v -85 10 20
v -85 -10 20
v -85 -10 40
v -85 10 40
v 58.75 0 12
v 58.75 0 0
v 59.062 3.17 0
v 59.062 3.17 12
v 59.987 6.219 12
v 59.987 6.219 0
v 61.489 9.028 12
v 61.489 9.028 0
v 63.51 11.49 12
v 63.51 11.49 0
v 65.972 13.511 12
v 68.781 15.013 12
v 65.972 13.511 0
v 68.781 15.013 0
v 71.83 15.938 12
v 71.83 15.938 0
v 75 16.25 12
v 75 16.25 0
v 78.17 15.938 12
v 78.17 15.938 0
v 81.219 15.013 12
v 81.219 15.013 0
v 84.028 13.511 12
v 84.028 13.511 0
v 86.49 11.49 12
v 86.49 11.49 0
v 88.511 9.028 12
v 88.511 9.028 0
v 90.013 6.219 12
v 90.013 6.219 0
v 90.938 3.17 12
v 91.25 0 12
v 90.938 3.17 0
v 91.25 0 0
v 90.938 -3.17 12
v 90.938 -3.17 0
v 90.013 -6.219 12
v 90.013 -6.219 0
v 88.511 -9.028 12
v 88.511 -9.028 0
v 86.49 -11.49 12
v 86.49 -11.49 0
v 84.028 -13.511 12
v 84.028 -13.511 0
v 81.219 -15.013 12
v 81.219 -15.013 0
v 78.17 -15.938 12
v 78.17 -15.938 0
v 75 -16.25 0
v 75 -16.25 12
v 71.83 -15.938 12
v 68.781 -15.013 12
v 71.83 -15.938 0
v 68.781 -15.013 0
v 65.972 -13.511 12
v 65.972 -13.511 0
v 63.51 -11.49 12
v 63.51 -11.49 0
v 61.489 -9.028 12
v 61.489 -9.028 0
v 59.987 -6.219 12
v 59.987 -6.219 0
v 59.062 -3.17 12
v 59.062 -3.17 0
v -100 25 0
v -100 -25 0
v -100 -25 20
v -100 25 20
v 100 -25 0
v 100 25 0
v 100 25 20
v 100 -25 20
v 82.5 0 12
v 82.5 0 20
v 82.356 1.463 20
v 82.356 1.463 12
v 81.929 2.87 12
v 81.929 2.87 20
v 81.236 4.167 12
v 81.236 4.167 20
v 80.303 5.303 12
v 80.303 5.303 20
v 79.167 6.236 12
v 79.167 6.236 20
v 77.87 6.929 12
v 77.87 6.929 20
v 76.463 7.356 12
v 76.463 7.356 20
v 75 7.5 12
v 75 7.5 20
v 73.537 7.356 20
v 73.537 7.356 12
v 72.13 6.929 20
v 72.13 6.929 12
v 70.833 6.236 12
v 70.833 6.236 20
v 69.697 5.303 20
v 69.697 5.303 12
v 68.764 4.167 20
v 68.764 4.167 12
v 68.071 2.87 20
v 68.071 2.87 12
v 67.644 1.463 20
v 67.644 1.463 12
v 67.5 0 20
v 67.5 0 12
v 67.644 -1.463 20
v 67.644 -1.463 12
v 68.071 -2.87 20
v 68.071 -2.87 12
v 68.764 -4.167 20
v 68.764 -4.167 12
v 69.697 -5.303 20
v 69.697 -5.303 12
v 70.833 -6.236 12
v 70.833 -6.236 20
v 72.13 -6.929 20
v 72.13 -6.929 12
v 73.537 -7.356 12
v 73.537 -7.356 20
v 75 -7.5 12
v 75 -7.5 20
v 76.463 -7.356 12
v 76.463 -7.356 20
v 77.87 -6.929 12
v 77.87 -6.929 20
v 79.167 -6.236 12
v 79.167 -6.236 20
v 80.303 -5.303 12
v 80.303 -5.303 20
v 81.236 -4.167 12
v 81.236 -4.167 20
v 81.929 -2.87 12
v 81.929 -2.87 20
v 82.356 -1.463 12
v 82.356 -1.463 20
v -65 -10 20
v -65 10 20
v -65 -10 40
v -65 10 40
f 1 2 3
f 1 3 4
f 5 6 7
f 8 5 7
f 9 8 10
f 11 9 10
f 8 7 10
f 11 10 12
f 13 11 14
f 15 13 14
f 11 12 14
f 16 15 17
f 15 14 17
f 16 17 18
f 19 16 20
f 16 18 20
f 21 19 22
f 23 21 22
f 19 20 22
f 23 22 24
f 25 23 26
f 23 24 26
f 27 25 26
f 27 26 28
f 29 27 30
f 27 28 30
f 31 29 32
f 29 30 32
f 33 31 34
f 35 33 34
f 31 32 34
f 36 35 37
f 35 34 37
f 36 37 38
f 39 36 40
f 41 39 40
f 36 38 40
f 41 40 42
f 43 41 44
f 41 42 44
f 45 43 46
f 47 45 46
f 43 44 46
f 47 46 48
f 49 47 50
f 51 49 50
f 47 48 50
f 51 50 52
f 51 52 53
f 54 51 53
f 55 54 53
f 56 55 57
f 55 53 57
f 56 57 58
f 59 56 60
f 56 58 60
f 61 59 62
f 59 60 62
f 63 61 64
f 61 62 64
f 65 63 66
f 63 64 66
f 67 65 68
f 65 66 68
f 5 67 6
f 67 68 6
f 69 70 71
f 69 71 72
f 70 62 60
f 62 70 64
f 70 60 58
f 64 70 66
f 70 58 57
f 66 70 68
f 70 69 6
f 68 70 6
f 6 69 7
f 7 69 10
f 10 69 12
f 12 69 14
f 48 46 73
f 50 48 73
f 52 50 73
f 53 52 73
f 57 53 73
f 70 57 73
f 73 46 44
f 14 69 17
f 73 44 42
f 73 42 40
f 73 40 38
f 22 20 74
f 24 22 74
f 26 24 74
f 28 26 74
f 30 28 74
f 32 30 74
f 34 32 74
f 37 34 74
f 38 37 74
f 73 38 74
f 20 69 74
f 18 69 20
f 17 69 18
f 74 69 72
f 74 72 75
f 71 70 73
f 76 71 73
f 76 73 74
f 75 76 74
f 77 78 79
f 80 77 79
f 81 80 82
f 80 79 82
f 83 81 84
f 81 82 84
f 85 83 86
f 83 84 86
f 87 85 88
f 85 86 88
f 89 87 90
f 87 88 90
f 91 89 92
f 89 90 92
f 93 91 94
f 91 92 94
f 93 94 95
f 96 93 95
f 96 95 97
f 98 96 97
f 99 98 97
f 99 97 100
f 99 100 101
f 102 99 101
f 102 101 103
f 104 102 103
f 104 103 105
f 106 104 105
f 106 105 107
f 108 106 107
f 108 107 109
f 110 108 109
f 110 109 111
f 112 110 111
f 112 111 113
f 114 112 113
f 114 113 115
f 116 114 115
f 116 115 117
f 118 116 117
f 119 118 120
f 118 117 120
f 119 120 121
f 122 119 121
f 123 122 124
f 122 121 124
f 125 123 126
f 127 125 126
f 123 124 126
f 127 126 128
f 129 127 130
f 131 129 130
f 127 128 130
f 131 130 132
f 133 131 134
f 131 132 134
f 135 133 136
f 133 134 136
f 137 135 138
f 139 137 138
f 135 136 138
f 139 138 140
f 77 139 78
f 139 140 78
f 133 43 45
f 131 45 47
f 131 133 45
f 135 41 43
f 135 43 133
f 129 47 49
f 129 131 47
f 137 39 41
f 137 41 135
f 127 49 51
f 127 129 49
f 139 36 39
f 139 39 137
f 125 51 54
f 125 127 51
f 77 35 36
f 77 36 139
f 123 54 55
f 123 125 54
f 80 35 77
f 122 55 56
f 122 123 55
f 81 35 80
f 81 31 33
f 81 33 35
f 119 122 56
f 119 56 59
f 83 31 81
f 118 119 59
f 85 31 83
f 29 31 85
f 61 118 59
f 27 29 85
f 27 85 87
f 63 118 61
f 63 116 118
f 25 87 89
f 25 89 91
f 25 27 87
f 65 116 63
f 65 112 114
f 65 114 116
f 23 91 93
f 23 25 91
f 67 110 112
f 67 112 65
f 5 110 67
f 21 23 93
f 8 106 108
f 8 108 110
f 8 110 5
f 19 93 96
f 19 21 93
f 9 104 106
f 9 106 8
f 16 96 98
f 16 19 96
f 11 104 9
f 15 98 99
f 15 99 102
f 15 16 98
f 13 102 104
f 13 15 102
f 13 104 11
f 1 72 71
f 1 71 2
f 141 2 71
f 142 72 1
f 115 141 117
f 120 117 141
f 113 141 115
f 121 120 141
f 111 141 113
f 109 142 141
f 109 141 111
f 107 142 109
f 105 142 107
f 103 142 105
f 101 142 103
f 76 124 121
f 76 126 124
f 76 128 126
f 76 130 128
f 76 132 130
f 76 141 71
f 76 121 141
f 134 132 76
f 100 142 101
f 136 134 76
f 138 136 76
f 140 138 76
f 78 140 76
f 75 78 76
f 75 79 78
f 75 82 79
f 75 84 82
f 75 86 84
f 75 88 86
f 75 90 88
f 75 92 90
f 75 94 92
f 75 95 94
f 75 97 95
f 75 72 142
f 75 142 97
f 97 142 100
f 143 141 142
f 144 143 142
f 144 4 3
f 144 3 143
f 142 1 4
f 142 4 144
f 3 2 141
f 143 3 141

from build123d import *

# Parameters (mm, degrees)
ESQUISSE1_W             = 200
ESQUISSE1_H             = 50
BOSS_EXTRU_1_DEPTH      = 20
ESQUISSE2_W             = 20
ESQUISSE2_H             = 20
BOSS_EXTRU_2_DEPTH      = 20
ESQUISSE3_R             = 7.5
ENL_V_MAT_EXTRU_1_DEPTH = 20
ESQUISSE8_R             = 16.25
ENL_V_MAT_EXTRU_3_DEPTH = 12


with BuildPart() as part:
    # Esquisse1 → Boss.-Extru.1 (new body)
    with BuildSketch(Plane.XY):
        Rectangle(ESQUISSE1_W, ESQUISSE1_H)
    extrude(amount=BOSS_EXTRU_1_DEPTH)

    # Esquisse2 → Boss.-Extru.2 (add)
    with BuildSketch(Plane.XY.offset(20)):
        with Locations((-75, 0)):
            Rectangle(ESQUISSE2_W, ESQUISSE2_H)
    extrude(amount=BOSS_EXTRU_2_DEPTH)

    # Esquisse3 → Enlèv. mat.-Extru.1 (cut)
    with BuildSketch(Plane.XY.offset(20)):
        with Locations((75, 0)):
            Circle(ESQUISSE3_R)
    extrude(amount=-ENL_V_MAT_EXTRU_1_DEPTH, mode=Mode.SUBTRACT)

    # Esquisse8 → Enlèv. mat.-Extru.3 (cut)
    with BuildSketch(Plane(origin=(0, 0, 0), x_dir=(-1, 0, 0), z_dir=(0, 0, -1))):
        with Locations((-75, 0)):
            Circle(ESQUISSE8_R)
    extrude(amount=-ENL_V_MAT_EXTRU_3_DEPTH, mode=Mode.SUBTRACT)


solid = part.part
